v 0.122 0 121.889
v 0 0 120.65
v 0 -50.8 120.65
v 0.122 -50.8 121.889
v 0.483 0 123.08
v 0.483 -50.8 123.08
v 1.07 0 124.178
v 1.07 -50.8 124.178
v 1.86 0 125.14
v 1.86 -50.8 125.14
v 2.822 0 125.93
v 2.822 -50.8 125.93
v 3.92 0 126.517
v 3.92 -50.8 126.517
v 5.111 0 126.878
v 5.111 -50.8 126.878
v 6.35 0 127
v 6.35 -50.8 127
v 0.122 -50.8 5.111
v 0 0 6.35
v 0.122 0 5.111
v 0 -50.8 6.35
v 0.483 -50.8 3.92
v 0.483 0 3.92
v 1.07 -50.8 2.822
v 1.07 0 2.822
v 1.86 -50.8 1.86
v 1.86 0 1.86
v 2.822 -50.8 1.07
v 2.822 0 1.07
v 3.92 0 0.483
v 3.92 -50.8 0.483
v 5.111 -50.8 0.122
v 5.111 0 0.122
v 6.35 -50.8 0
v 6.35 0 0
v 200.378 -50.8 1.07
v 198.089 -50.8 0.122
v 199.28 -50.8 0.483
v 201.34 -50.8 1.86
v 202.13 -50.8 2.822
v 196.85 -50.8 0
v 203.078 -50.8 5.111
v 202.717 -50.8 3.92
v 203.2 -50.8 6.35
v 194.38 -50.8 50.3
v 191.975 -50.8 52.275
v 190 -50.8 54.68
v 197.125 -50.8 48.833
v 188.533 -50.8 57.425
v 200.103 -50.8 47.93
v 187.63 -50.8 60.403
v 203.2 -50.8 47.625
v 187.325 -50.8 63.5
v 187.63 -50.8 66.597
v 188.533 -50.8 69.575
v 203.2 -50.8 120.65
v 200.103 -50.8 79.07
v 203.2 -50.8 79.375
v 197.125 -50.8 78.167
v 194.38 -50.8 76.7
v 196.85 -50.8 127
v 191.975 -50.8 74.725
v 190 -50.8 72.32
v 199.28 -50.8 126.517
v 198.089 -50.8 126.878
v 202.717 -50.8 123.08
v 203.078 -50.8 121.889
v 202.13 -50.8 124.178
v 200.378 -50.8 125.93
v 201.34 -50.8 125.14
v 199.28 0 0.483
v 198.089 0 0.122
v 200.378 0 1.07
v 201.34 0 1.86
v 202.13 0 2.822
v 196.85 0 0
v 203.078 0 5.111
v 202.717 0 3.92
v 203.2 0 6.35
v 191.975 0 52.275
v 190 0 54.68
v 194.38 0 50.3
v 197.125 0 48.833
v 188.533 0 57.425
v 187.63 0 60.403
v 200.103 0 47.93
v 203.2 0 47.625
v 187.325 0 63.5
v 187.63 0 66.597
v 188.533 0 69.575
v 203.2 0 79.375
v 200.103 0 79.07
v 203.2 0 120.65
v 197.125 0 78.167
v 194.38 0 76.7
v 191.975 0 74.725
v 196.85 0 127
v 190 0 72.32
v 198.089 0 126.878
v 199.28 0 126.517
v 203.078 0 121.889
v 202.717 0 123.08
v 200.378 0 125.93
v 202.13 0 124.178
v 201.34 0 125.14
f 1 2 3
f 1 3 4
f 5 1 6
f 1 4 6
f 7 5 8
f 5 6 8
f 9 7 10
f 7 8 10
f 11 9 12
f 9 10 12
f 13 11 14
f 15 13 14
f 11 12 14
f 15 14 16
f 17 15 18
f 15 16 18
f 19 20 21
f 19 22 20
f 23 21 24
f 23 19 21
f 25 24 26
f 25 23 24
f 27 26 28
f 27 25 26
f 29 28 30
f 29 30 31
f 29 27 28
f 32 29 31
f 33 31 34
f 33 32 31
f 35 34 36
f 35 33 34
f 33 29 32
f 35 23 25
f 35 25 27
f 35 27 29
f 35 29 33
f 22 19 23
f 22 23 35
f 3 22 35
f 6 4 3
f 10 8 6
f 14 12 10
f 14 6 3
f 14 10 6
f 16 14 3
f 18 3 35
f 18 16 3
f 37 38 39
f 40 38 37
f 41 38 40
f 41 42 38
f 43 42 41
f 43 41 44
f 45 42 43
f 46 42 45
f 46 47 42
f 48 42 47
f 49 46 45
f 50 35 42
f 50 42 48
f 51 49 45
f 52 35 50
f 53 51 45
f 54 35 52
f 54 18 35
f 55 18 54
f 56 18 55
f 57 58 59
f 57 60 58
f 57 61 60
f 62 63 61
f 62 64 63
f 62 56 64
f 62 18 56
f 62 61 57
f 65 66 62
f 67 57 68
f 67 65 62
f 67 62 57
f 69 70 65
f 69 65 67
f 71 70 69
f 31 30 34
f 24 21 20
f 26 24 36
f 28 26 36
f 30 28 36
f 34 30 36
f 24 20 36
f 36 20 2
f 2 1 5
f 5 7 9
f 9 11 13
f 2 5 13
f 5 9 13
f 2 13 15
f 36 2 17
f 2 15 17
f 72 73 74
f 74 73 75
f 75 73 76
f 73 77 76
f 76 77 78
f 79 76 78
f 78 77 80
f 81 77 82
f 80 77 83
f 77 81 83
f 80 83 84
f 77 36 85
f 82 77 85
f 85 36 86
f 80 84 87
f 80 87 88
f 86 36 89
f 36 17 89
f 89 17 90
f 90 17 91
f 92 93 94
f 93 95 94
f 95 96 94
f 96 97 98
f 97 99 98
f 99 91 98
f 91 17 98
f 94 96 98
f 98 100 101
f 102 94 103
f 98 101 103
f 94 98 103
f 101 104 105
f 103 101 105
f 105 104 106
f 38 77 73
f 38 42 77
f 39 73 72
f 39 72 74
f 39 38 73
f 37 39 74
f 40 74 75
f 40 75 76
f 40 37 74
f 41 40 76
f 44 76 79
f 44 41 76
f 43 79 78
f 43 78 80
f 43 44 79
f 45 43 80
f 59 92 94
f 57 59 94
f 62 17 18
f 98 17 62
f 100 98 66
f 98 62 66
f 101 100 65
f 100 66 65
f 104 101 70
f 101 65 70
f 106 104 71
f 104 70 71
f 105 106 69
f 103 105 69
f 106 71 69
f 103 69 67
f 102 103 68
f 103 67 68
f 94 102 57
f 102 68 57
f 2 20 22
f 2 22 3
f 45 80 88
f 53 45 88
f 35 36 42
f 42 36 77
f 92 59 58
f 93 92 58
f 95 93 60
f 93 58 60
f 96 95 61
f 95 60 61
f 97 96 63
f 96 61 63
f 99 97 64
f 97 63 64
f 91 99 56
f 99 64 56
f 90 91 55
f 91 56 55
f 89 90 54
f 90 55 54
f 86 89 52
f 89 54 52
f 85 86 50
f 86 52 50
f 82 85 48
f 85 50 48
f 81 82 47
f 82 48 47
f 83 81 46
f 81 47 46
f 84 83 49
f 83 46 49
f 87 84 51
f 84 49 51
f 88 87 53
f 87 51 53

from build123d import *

# Parameters (mm, degrees)
F0_W     = 203.2
F0_H     = 127
F1_DEPTH = 50.8
F2_R     = 15.875
F3_DEPTH = 50.801
F4_R     = 6.35


with BuildPart() as f1:
    # F0 (on Front) → F1 (new body)
    with BuildSketch(Plane.XZ):
        with Locations((101.6, 63.5)):
            Rectangle(F0_W, F0_H)
    extrude(amount=F1_DEPTH)

    # F2 (on face) → F3 (cut, through all)
    with BuildSketch(Plane.XZ.offset(50.8)):
        with Locations((203.2, 63.5)):
            Circle(F2_R)
    extrude(amount=-F3_DEPTH, mode=Mode.SUBTRACT)

    # F4
    f4_edges = [f1.edges().sort_by_distance(p)[0] for p in [
        (203.2, -25.4, 127),
        (203.2, -25.4, 0),
        (0, -25.4, 127),
        (0, -25.4, 0),
    ]]
    fillet(f4_edges, radius=F4_R)


solid = f1.part
